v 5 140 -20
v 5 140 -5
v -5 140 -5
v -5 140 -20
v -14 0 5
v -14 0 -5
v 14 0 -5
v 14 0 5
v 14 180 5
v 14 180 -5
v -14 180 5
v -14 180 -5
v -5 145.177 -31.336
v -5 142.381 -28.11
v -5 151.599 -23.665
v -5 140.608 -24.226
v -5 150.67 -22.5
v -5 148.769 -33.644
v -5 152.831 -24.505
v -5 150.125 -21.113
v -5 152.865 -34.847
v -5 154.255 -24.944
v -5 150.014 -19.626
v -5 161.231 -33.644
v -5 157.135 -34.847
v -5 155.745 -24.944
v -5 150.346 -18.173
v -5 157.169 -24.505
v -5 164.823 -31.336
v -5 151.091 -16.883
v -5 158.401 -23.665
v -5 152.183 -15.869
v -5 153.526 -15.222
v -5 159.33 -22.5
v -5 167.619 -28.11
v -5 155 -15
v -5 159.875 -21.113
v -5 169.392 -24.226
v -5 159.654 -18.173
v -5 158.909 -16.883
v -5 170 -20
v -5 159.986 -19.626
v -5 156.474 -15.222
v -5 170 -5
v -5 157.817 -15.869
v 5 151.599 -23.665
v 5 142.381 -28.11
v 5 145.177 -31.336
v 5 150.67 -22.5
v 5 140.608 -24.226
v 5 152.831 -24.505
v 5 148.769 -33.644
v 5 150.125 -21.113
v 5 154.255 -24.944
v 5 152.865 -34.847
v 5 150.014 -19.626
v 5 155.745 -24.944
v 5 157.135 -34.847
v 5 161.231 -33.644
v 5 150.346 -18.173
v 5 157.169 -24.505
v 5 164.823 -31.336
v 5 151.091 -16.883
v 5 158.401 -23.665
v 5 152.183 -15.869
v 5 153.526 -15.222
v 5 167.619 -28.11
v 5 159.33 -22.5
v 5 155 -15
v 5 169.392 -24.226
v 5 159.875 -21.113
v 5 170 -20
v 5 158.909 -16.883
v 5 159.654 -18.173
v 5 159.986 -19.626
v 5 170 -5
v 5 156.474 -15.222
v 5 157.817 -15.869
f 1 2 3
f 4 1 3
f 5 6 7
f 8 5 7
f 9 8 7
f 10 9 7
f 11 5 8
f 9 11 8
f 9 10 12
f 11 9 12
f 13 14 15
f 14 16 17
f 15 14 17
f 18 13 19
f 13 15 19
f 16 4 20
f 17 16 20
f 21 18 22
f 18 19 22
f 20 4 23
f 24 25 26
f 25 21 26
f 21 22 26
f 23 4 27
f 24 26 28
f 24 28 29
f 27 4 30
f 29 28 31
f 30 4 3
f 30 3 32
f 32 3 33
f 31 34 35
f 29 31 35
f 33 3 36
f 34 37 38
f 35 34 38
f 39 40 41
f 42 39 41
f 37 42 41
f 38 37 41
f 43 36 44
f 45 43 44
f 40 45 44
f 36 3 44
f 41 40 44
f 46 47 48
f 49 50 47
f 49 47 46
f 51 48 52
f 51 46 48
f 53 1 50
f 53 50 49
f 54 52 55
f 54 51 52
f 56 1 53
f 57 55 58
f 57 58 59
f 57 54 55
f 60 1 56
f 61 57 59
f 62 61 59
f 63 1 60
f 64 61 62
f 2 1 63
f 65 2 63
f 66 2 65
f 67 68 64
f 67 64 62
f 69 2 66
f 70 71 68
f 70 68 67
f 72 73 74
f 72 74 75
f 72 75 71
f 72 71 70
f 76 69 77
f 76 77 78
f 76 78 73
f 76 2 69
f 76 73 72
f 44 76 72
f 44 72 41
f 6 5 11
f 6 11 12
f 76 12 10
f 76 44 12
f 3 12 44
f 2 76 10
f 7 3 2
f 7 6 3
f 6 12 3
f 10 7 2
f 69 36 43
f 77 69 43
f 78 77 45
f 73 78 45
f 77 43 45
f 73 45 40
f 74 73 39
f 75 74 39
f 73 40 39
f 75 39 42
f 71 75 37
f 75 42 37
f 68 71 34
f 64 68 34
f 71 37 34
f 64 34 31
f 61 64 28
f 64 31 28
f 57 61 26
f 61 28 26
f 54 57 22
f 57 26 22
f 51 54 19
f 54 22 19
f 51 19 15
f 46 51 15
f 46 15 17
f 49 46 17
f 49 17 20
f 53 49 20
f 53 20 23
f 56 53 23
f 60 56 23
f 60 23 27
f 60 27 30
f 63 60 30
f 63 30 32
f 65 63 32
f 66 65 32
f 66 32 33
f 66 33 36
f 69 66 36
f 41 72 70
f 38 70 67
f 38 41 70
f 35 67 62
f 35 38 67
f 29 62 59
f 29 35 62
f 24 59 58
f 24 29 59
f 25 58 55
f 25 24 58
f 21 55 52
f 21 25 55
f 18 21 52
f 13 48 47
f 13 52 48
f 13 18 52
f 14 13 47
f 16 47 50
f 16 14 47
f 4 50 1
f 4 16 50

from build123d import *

# Parameters (mm, degrees)
SKETCH1_W           = 28
SKETCH1_H           = 10
BOSS_EXTRUDE1_DEPTH = 270
SKETCH2_W           = 10
SKETCH2_H           = 30
BOSS_EXTRUDE2_DEPTH = 30
SKETCH3_R           = 5
CUT_EXTRUDE1_DEPTH  = 30
SKETCH4_W           = 28
SKETCH4_H           = 90
CUT_EXTRUDE2_DEPTH  = 10


with BuildPart() as part:
    # Sketch1 → Boss-Extrude1 (new body)
    with BuildSketch(Plane(origin=(0, 0, 0), x_dir=(1, 0, 0), z_dir=(0, 1, 0))):
        Rectangle(SKETCH1_W, SKETCH1_H)
    extrude(amount=BOSS_EXTRUDE1_DEPTH)

    # Sketch2 → Boss-Extrude2 (add)
    with BuildSketch(Plane(origin=(0, 0, -5), x_dir=(-1, 0, 0), z_dir=(0, 0, -1))):
        with Locations((0, 155)):
            Rectangle(SKETCH2_W, SKETCH2_H)
    extrude(amount=BOSS_EXTRUDE2_DEPTH)

    # Sketch3 → Cut-Extrude1 (cut)
    with BuildSketch(Plane.ZY.offset(5)):
        with Locations((-20, 155)):
            Circle(SKETCH3_R)
        with BuildLine():
            Line((-20, 140), (-48.501597926, 140))
            Line((-48.501597926, 140), (-48.501597926, 172.313488336))
            Line((-48.501597926, 172.313488336), (-20, 170))
            ThreePointArc((-20, 170), (-35, 155), (-20, 140))
        make_face()
    extrude(amount=-CUT_EXTRUDE1_DEPTH, mode=Mode.SUBTRACT)

    # Sketch4 → Cut-Extrude2 (cut)
    with BuildSketch(Plane(origin=(0, 0, -5), x_dir=(-1, 0, 0), z_dir=(0, 0, -1))):
        with Locations((0, 225)):
            Rectangle(SKETCH4_W, SKETCH4_H)
    extrude(amount=-CUT_EXTRUDE2_DEPTH, mode=Mode.SUBTRACT)


solid = part.part
